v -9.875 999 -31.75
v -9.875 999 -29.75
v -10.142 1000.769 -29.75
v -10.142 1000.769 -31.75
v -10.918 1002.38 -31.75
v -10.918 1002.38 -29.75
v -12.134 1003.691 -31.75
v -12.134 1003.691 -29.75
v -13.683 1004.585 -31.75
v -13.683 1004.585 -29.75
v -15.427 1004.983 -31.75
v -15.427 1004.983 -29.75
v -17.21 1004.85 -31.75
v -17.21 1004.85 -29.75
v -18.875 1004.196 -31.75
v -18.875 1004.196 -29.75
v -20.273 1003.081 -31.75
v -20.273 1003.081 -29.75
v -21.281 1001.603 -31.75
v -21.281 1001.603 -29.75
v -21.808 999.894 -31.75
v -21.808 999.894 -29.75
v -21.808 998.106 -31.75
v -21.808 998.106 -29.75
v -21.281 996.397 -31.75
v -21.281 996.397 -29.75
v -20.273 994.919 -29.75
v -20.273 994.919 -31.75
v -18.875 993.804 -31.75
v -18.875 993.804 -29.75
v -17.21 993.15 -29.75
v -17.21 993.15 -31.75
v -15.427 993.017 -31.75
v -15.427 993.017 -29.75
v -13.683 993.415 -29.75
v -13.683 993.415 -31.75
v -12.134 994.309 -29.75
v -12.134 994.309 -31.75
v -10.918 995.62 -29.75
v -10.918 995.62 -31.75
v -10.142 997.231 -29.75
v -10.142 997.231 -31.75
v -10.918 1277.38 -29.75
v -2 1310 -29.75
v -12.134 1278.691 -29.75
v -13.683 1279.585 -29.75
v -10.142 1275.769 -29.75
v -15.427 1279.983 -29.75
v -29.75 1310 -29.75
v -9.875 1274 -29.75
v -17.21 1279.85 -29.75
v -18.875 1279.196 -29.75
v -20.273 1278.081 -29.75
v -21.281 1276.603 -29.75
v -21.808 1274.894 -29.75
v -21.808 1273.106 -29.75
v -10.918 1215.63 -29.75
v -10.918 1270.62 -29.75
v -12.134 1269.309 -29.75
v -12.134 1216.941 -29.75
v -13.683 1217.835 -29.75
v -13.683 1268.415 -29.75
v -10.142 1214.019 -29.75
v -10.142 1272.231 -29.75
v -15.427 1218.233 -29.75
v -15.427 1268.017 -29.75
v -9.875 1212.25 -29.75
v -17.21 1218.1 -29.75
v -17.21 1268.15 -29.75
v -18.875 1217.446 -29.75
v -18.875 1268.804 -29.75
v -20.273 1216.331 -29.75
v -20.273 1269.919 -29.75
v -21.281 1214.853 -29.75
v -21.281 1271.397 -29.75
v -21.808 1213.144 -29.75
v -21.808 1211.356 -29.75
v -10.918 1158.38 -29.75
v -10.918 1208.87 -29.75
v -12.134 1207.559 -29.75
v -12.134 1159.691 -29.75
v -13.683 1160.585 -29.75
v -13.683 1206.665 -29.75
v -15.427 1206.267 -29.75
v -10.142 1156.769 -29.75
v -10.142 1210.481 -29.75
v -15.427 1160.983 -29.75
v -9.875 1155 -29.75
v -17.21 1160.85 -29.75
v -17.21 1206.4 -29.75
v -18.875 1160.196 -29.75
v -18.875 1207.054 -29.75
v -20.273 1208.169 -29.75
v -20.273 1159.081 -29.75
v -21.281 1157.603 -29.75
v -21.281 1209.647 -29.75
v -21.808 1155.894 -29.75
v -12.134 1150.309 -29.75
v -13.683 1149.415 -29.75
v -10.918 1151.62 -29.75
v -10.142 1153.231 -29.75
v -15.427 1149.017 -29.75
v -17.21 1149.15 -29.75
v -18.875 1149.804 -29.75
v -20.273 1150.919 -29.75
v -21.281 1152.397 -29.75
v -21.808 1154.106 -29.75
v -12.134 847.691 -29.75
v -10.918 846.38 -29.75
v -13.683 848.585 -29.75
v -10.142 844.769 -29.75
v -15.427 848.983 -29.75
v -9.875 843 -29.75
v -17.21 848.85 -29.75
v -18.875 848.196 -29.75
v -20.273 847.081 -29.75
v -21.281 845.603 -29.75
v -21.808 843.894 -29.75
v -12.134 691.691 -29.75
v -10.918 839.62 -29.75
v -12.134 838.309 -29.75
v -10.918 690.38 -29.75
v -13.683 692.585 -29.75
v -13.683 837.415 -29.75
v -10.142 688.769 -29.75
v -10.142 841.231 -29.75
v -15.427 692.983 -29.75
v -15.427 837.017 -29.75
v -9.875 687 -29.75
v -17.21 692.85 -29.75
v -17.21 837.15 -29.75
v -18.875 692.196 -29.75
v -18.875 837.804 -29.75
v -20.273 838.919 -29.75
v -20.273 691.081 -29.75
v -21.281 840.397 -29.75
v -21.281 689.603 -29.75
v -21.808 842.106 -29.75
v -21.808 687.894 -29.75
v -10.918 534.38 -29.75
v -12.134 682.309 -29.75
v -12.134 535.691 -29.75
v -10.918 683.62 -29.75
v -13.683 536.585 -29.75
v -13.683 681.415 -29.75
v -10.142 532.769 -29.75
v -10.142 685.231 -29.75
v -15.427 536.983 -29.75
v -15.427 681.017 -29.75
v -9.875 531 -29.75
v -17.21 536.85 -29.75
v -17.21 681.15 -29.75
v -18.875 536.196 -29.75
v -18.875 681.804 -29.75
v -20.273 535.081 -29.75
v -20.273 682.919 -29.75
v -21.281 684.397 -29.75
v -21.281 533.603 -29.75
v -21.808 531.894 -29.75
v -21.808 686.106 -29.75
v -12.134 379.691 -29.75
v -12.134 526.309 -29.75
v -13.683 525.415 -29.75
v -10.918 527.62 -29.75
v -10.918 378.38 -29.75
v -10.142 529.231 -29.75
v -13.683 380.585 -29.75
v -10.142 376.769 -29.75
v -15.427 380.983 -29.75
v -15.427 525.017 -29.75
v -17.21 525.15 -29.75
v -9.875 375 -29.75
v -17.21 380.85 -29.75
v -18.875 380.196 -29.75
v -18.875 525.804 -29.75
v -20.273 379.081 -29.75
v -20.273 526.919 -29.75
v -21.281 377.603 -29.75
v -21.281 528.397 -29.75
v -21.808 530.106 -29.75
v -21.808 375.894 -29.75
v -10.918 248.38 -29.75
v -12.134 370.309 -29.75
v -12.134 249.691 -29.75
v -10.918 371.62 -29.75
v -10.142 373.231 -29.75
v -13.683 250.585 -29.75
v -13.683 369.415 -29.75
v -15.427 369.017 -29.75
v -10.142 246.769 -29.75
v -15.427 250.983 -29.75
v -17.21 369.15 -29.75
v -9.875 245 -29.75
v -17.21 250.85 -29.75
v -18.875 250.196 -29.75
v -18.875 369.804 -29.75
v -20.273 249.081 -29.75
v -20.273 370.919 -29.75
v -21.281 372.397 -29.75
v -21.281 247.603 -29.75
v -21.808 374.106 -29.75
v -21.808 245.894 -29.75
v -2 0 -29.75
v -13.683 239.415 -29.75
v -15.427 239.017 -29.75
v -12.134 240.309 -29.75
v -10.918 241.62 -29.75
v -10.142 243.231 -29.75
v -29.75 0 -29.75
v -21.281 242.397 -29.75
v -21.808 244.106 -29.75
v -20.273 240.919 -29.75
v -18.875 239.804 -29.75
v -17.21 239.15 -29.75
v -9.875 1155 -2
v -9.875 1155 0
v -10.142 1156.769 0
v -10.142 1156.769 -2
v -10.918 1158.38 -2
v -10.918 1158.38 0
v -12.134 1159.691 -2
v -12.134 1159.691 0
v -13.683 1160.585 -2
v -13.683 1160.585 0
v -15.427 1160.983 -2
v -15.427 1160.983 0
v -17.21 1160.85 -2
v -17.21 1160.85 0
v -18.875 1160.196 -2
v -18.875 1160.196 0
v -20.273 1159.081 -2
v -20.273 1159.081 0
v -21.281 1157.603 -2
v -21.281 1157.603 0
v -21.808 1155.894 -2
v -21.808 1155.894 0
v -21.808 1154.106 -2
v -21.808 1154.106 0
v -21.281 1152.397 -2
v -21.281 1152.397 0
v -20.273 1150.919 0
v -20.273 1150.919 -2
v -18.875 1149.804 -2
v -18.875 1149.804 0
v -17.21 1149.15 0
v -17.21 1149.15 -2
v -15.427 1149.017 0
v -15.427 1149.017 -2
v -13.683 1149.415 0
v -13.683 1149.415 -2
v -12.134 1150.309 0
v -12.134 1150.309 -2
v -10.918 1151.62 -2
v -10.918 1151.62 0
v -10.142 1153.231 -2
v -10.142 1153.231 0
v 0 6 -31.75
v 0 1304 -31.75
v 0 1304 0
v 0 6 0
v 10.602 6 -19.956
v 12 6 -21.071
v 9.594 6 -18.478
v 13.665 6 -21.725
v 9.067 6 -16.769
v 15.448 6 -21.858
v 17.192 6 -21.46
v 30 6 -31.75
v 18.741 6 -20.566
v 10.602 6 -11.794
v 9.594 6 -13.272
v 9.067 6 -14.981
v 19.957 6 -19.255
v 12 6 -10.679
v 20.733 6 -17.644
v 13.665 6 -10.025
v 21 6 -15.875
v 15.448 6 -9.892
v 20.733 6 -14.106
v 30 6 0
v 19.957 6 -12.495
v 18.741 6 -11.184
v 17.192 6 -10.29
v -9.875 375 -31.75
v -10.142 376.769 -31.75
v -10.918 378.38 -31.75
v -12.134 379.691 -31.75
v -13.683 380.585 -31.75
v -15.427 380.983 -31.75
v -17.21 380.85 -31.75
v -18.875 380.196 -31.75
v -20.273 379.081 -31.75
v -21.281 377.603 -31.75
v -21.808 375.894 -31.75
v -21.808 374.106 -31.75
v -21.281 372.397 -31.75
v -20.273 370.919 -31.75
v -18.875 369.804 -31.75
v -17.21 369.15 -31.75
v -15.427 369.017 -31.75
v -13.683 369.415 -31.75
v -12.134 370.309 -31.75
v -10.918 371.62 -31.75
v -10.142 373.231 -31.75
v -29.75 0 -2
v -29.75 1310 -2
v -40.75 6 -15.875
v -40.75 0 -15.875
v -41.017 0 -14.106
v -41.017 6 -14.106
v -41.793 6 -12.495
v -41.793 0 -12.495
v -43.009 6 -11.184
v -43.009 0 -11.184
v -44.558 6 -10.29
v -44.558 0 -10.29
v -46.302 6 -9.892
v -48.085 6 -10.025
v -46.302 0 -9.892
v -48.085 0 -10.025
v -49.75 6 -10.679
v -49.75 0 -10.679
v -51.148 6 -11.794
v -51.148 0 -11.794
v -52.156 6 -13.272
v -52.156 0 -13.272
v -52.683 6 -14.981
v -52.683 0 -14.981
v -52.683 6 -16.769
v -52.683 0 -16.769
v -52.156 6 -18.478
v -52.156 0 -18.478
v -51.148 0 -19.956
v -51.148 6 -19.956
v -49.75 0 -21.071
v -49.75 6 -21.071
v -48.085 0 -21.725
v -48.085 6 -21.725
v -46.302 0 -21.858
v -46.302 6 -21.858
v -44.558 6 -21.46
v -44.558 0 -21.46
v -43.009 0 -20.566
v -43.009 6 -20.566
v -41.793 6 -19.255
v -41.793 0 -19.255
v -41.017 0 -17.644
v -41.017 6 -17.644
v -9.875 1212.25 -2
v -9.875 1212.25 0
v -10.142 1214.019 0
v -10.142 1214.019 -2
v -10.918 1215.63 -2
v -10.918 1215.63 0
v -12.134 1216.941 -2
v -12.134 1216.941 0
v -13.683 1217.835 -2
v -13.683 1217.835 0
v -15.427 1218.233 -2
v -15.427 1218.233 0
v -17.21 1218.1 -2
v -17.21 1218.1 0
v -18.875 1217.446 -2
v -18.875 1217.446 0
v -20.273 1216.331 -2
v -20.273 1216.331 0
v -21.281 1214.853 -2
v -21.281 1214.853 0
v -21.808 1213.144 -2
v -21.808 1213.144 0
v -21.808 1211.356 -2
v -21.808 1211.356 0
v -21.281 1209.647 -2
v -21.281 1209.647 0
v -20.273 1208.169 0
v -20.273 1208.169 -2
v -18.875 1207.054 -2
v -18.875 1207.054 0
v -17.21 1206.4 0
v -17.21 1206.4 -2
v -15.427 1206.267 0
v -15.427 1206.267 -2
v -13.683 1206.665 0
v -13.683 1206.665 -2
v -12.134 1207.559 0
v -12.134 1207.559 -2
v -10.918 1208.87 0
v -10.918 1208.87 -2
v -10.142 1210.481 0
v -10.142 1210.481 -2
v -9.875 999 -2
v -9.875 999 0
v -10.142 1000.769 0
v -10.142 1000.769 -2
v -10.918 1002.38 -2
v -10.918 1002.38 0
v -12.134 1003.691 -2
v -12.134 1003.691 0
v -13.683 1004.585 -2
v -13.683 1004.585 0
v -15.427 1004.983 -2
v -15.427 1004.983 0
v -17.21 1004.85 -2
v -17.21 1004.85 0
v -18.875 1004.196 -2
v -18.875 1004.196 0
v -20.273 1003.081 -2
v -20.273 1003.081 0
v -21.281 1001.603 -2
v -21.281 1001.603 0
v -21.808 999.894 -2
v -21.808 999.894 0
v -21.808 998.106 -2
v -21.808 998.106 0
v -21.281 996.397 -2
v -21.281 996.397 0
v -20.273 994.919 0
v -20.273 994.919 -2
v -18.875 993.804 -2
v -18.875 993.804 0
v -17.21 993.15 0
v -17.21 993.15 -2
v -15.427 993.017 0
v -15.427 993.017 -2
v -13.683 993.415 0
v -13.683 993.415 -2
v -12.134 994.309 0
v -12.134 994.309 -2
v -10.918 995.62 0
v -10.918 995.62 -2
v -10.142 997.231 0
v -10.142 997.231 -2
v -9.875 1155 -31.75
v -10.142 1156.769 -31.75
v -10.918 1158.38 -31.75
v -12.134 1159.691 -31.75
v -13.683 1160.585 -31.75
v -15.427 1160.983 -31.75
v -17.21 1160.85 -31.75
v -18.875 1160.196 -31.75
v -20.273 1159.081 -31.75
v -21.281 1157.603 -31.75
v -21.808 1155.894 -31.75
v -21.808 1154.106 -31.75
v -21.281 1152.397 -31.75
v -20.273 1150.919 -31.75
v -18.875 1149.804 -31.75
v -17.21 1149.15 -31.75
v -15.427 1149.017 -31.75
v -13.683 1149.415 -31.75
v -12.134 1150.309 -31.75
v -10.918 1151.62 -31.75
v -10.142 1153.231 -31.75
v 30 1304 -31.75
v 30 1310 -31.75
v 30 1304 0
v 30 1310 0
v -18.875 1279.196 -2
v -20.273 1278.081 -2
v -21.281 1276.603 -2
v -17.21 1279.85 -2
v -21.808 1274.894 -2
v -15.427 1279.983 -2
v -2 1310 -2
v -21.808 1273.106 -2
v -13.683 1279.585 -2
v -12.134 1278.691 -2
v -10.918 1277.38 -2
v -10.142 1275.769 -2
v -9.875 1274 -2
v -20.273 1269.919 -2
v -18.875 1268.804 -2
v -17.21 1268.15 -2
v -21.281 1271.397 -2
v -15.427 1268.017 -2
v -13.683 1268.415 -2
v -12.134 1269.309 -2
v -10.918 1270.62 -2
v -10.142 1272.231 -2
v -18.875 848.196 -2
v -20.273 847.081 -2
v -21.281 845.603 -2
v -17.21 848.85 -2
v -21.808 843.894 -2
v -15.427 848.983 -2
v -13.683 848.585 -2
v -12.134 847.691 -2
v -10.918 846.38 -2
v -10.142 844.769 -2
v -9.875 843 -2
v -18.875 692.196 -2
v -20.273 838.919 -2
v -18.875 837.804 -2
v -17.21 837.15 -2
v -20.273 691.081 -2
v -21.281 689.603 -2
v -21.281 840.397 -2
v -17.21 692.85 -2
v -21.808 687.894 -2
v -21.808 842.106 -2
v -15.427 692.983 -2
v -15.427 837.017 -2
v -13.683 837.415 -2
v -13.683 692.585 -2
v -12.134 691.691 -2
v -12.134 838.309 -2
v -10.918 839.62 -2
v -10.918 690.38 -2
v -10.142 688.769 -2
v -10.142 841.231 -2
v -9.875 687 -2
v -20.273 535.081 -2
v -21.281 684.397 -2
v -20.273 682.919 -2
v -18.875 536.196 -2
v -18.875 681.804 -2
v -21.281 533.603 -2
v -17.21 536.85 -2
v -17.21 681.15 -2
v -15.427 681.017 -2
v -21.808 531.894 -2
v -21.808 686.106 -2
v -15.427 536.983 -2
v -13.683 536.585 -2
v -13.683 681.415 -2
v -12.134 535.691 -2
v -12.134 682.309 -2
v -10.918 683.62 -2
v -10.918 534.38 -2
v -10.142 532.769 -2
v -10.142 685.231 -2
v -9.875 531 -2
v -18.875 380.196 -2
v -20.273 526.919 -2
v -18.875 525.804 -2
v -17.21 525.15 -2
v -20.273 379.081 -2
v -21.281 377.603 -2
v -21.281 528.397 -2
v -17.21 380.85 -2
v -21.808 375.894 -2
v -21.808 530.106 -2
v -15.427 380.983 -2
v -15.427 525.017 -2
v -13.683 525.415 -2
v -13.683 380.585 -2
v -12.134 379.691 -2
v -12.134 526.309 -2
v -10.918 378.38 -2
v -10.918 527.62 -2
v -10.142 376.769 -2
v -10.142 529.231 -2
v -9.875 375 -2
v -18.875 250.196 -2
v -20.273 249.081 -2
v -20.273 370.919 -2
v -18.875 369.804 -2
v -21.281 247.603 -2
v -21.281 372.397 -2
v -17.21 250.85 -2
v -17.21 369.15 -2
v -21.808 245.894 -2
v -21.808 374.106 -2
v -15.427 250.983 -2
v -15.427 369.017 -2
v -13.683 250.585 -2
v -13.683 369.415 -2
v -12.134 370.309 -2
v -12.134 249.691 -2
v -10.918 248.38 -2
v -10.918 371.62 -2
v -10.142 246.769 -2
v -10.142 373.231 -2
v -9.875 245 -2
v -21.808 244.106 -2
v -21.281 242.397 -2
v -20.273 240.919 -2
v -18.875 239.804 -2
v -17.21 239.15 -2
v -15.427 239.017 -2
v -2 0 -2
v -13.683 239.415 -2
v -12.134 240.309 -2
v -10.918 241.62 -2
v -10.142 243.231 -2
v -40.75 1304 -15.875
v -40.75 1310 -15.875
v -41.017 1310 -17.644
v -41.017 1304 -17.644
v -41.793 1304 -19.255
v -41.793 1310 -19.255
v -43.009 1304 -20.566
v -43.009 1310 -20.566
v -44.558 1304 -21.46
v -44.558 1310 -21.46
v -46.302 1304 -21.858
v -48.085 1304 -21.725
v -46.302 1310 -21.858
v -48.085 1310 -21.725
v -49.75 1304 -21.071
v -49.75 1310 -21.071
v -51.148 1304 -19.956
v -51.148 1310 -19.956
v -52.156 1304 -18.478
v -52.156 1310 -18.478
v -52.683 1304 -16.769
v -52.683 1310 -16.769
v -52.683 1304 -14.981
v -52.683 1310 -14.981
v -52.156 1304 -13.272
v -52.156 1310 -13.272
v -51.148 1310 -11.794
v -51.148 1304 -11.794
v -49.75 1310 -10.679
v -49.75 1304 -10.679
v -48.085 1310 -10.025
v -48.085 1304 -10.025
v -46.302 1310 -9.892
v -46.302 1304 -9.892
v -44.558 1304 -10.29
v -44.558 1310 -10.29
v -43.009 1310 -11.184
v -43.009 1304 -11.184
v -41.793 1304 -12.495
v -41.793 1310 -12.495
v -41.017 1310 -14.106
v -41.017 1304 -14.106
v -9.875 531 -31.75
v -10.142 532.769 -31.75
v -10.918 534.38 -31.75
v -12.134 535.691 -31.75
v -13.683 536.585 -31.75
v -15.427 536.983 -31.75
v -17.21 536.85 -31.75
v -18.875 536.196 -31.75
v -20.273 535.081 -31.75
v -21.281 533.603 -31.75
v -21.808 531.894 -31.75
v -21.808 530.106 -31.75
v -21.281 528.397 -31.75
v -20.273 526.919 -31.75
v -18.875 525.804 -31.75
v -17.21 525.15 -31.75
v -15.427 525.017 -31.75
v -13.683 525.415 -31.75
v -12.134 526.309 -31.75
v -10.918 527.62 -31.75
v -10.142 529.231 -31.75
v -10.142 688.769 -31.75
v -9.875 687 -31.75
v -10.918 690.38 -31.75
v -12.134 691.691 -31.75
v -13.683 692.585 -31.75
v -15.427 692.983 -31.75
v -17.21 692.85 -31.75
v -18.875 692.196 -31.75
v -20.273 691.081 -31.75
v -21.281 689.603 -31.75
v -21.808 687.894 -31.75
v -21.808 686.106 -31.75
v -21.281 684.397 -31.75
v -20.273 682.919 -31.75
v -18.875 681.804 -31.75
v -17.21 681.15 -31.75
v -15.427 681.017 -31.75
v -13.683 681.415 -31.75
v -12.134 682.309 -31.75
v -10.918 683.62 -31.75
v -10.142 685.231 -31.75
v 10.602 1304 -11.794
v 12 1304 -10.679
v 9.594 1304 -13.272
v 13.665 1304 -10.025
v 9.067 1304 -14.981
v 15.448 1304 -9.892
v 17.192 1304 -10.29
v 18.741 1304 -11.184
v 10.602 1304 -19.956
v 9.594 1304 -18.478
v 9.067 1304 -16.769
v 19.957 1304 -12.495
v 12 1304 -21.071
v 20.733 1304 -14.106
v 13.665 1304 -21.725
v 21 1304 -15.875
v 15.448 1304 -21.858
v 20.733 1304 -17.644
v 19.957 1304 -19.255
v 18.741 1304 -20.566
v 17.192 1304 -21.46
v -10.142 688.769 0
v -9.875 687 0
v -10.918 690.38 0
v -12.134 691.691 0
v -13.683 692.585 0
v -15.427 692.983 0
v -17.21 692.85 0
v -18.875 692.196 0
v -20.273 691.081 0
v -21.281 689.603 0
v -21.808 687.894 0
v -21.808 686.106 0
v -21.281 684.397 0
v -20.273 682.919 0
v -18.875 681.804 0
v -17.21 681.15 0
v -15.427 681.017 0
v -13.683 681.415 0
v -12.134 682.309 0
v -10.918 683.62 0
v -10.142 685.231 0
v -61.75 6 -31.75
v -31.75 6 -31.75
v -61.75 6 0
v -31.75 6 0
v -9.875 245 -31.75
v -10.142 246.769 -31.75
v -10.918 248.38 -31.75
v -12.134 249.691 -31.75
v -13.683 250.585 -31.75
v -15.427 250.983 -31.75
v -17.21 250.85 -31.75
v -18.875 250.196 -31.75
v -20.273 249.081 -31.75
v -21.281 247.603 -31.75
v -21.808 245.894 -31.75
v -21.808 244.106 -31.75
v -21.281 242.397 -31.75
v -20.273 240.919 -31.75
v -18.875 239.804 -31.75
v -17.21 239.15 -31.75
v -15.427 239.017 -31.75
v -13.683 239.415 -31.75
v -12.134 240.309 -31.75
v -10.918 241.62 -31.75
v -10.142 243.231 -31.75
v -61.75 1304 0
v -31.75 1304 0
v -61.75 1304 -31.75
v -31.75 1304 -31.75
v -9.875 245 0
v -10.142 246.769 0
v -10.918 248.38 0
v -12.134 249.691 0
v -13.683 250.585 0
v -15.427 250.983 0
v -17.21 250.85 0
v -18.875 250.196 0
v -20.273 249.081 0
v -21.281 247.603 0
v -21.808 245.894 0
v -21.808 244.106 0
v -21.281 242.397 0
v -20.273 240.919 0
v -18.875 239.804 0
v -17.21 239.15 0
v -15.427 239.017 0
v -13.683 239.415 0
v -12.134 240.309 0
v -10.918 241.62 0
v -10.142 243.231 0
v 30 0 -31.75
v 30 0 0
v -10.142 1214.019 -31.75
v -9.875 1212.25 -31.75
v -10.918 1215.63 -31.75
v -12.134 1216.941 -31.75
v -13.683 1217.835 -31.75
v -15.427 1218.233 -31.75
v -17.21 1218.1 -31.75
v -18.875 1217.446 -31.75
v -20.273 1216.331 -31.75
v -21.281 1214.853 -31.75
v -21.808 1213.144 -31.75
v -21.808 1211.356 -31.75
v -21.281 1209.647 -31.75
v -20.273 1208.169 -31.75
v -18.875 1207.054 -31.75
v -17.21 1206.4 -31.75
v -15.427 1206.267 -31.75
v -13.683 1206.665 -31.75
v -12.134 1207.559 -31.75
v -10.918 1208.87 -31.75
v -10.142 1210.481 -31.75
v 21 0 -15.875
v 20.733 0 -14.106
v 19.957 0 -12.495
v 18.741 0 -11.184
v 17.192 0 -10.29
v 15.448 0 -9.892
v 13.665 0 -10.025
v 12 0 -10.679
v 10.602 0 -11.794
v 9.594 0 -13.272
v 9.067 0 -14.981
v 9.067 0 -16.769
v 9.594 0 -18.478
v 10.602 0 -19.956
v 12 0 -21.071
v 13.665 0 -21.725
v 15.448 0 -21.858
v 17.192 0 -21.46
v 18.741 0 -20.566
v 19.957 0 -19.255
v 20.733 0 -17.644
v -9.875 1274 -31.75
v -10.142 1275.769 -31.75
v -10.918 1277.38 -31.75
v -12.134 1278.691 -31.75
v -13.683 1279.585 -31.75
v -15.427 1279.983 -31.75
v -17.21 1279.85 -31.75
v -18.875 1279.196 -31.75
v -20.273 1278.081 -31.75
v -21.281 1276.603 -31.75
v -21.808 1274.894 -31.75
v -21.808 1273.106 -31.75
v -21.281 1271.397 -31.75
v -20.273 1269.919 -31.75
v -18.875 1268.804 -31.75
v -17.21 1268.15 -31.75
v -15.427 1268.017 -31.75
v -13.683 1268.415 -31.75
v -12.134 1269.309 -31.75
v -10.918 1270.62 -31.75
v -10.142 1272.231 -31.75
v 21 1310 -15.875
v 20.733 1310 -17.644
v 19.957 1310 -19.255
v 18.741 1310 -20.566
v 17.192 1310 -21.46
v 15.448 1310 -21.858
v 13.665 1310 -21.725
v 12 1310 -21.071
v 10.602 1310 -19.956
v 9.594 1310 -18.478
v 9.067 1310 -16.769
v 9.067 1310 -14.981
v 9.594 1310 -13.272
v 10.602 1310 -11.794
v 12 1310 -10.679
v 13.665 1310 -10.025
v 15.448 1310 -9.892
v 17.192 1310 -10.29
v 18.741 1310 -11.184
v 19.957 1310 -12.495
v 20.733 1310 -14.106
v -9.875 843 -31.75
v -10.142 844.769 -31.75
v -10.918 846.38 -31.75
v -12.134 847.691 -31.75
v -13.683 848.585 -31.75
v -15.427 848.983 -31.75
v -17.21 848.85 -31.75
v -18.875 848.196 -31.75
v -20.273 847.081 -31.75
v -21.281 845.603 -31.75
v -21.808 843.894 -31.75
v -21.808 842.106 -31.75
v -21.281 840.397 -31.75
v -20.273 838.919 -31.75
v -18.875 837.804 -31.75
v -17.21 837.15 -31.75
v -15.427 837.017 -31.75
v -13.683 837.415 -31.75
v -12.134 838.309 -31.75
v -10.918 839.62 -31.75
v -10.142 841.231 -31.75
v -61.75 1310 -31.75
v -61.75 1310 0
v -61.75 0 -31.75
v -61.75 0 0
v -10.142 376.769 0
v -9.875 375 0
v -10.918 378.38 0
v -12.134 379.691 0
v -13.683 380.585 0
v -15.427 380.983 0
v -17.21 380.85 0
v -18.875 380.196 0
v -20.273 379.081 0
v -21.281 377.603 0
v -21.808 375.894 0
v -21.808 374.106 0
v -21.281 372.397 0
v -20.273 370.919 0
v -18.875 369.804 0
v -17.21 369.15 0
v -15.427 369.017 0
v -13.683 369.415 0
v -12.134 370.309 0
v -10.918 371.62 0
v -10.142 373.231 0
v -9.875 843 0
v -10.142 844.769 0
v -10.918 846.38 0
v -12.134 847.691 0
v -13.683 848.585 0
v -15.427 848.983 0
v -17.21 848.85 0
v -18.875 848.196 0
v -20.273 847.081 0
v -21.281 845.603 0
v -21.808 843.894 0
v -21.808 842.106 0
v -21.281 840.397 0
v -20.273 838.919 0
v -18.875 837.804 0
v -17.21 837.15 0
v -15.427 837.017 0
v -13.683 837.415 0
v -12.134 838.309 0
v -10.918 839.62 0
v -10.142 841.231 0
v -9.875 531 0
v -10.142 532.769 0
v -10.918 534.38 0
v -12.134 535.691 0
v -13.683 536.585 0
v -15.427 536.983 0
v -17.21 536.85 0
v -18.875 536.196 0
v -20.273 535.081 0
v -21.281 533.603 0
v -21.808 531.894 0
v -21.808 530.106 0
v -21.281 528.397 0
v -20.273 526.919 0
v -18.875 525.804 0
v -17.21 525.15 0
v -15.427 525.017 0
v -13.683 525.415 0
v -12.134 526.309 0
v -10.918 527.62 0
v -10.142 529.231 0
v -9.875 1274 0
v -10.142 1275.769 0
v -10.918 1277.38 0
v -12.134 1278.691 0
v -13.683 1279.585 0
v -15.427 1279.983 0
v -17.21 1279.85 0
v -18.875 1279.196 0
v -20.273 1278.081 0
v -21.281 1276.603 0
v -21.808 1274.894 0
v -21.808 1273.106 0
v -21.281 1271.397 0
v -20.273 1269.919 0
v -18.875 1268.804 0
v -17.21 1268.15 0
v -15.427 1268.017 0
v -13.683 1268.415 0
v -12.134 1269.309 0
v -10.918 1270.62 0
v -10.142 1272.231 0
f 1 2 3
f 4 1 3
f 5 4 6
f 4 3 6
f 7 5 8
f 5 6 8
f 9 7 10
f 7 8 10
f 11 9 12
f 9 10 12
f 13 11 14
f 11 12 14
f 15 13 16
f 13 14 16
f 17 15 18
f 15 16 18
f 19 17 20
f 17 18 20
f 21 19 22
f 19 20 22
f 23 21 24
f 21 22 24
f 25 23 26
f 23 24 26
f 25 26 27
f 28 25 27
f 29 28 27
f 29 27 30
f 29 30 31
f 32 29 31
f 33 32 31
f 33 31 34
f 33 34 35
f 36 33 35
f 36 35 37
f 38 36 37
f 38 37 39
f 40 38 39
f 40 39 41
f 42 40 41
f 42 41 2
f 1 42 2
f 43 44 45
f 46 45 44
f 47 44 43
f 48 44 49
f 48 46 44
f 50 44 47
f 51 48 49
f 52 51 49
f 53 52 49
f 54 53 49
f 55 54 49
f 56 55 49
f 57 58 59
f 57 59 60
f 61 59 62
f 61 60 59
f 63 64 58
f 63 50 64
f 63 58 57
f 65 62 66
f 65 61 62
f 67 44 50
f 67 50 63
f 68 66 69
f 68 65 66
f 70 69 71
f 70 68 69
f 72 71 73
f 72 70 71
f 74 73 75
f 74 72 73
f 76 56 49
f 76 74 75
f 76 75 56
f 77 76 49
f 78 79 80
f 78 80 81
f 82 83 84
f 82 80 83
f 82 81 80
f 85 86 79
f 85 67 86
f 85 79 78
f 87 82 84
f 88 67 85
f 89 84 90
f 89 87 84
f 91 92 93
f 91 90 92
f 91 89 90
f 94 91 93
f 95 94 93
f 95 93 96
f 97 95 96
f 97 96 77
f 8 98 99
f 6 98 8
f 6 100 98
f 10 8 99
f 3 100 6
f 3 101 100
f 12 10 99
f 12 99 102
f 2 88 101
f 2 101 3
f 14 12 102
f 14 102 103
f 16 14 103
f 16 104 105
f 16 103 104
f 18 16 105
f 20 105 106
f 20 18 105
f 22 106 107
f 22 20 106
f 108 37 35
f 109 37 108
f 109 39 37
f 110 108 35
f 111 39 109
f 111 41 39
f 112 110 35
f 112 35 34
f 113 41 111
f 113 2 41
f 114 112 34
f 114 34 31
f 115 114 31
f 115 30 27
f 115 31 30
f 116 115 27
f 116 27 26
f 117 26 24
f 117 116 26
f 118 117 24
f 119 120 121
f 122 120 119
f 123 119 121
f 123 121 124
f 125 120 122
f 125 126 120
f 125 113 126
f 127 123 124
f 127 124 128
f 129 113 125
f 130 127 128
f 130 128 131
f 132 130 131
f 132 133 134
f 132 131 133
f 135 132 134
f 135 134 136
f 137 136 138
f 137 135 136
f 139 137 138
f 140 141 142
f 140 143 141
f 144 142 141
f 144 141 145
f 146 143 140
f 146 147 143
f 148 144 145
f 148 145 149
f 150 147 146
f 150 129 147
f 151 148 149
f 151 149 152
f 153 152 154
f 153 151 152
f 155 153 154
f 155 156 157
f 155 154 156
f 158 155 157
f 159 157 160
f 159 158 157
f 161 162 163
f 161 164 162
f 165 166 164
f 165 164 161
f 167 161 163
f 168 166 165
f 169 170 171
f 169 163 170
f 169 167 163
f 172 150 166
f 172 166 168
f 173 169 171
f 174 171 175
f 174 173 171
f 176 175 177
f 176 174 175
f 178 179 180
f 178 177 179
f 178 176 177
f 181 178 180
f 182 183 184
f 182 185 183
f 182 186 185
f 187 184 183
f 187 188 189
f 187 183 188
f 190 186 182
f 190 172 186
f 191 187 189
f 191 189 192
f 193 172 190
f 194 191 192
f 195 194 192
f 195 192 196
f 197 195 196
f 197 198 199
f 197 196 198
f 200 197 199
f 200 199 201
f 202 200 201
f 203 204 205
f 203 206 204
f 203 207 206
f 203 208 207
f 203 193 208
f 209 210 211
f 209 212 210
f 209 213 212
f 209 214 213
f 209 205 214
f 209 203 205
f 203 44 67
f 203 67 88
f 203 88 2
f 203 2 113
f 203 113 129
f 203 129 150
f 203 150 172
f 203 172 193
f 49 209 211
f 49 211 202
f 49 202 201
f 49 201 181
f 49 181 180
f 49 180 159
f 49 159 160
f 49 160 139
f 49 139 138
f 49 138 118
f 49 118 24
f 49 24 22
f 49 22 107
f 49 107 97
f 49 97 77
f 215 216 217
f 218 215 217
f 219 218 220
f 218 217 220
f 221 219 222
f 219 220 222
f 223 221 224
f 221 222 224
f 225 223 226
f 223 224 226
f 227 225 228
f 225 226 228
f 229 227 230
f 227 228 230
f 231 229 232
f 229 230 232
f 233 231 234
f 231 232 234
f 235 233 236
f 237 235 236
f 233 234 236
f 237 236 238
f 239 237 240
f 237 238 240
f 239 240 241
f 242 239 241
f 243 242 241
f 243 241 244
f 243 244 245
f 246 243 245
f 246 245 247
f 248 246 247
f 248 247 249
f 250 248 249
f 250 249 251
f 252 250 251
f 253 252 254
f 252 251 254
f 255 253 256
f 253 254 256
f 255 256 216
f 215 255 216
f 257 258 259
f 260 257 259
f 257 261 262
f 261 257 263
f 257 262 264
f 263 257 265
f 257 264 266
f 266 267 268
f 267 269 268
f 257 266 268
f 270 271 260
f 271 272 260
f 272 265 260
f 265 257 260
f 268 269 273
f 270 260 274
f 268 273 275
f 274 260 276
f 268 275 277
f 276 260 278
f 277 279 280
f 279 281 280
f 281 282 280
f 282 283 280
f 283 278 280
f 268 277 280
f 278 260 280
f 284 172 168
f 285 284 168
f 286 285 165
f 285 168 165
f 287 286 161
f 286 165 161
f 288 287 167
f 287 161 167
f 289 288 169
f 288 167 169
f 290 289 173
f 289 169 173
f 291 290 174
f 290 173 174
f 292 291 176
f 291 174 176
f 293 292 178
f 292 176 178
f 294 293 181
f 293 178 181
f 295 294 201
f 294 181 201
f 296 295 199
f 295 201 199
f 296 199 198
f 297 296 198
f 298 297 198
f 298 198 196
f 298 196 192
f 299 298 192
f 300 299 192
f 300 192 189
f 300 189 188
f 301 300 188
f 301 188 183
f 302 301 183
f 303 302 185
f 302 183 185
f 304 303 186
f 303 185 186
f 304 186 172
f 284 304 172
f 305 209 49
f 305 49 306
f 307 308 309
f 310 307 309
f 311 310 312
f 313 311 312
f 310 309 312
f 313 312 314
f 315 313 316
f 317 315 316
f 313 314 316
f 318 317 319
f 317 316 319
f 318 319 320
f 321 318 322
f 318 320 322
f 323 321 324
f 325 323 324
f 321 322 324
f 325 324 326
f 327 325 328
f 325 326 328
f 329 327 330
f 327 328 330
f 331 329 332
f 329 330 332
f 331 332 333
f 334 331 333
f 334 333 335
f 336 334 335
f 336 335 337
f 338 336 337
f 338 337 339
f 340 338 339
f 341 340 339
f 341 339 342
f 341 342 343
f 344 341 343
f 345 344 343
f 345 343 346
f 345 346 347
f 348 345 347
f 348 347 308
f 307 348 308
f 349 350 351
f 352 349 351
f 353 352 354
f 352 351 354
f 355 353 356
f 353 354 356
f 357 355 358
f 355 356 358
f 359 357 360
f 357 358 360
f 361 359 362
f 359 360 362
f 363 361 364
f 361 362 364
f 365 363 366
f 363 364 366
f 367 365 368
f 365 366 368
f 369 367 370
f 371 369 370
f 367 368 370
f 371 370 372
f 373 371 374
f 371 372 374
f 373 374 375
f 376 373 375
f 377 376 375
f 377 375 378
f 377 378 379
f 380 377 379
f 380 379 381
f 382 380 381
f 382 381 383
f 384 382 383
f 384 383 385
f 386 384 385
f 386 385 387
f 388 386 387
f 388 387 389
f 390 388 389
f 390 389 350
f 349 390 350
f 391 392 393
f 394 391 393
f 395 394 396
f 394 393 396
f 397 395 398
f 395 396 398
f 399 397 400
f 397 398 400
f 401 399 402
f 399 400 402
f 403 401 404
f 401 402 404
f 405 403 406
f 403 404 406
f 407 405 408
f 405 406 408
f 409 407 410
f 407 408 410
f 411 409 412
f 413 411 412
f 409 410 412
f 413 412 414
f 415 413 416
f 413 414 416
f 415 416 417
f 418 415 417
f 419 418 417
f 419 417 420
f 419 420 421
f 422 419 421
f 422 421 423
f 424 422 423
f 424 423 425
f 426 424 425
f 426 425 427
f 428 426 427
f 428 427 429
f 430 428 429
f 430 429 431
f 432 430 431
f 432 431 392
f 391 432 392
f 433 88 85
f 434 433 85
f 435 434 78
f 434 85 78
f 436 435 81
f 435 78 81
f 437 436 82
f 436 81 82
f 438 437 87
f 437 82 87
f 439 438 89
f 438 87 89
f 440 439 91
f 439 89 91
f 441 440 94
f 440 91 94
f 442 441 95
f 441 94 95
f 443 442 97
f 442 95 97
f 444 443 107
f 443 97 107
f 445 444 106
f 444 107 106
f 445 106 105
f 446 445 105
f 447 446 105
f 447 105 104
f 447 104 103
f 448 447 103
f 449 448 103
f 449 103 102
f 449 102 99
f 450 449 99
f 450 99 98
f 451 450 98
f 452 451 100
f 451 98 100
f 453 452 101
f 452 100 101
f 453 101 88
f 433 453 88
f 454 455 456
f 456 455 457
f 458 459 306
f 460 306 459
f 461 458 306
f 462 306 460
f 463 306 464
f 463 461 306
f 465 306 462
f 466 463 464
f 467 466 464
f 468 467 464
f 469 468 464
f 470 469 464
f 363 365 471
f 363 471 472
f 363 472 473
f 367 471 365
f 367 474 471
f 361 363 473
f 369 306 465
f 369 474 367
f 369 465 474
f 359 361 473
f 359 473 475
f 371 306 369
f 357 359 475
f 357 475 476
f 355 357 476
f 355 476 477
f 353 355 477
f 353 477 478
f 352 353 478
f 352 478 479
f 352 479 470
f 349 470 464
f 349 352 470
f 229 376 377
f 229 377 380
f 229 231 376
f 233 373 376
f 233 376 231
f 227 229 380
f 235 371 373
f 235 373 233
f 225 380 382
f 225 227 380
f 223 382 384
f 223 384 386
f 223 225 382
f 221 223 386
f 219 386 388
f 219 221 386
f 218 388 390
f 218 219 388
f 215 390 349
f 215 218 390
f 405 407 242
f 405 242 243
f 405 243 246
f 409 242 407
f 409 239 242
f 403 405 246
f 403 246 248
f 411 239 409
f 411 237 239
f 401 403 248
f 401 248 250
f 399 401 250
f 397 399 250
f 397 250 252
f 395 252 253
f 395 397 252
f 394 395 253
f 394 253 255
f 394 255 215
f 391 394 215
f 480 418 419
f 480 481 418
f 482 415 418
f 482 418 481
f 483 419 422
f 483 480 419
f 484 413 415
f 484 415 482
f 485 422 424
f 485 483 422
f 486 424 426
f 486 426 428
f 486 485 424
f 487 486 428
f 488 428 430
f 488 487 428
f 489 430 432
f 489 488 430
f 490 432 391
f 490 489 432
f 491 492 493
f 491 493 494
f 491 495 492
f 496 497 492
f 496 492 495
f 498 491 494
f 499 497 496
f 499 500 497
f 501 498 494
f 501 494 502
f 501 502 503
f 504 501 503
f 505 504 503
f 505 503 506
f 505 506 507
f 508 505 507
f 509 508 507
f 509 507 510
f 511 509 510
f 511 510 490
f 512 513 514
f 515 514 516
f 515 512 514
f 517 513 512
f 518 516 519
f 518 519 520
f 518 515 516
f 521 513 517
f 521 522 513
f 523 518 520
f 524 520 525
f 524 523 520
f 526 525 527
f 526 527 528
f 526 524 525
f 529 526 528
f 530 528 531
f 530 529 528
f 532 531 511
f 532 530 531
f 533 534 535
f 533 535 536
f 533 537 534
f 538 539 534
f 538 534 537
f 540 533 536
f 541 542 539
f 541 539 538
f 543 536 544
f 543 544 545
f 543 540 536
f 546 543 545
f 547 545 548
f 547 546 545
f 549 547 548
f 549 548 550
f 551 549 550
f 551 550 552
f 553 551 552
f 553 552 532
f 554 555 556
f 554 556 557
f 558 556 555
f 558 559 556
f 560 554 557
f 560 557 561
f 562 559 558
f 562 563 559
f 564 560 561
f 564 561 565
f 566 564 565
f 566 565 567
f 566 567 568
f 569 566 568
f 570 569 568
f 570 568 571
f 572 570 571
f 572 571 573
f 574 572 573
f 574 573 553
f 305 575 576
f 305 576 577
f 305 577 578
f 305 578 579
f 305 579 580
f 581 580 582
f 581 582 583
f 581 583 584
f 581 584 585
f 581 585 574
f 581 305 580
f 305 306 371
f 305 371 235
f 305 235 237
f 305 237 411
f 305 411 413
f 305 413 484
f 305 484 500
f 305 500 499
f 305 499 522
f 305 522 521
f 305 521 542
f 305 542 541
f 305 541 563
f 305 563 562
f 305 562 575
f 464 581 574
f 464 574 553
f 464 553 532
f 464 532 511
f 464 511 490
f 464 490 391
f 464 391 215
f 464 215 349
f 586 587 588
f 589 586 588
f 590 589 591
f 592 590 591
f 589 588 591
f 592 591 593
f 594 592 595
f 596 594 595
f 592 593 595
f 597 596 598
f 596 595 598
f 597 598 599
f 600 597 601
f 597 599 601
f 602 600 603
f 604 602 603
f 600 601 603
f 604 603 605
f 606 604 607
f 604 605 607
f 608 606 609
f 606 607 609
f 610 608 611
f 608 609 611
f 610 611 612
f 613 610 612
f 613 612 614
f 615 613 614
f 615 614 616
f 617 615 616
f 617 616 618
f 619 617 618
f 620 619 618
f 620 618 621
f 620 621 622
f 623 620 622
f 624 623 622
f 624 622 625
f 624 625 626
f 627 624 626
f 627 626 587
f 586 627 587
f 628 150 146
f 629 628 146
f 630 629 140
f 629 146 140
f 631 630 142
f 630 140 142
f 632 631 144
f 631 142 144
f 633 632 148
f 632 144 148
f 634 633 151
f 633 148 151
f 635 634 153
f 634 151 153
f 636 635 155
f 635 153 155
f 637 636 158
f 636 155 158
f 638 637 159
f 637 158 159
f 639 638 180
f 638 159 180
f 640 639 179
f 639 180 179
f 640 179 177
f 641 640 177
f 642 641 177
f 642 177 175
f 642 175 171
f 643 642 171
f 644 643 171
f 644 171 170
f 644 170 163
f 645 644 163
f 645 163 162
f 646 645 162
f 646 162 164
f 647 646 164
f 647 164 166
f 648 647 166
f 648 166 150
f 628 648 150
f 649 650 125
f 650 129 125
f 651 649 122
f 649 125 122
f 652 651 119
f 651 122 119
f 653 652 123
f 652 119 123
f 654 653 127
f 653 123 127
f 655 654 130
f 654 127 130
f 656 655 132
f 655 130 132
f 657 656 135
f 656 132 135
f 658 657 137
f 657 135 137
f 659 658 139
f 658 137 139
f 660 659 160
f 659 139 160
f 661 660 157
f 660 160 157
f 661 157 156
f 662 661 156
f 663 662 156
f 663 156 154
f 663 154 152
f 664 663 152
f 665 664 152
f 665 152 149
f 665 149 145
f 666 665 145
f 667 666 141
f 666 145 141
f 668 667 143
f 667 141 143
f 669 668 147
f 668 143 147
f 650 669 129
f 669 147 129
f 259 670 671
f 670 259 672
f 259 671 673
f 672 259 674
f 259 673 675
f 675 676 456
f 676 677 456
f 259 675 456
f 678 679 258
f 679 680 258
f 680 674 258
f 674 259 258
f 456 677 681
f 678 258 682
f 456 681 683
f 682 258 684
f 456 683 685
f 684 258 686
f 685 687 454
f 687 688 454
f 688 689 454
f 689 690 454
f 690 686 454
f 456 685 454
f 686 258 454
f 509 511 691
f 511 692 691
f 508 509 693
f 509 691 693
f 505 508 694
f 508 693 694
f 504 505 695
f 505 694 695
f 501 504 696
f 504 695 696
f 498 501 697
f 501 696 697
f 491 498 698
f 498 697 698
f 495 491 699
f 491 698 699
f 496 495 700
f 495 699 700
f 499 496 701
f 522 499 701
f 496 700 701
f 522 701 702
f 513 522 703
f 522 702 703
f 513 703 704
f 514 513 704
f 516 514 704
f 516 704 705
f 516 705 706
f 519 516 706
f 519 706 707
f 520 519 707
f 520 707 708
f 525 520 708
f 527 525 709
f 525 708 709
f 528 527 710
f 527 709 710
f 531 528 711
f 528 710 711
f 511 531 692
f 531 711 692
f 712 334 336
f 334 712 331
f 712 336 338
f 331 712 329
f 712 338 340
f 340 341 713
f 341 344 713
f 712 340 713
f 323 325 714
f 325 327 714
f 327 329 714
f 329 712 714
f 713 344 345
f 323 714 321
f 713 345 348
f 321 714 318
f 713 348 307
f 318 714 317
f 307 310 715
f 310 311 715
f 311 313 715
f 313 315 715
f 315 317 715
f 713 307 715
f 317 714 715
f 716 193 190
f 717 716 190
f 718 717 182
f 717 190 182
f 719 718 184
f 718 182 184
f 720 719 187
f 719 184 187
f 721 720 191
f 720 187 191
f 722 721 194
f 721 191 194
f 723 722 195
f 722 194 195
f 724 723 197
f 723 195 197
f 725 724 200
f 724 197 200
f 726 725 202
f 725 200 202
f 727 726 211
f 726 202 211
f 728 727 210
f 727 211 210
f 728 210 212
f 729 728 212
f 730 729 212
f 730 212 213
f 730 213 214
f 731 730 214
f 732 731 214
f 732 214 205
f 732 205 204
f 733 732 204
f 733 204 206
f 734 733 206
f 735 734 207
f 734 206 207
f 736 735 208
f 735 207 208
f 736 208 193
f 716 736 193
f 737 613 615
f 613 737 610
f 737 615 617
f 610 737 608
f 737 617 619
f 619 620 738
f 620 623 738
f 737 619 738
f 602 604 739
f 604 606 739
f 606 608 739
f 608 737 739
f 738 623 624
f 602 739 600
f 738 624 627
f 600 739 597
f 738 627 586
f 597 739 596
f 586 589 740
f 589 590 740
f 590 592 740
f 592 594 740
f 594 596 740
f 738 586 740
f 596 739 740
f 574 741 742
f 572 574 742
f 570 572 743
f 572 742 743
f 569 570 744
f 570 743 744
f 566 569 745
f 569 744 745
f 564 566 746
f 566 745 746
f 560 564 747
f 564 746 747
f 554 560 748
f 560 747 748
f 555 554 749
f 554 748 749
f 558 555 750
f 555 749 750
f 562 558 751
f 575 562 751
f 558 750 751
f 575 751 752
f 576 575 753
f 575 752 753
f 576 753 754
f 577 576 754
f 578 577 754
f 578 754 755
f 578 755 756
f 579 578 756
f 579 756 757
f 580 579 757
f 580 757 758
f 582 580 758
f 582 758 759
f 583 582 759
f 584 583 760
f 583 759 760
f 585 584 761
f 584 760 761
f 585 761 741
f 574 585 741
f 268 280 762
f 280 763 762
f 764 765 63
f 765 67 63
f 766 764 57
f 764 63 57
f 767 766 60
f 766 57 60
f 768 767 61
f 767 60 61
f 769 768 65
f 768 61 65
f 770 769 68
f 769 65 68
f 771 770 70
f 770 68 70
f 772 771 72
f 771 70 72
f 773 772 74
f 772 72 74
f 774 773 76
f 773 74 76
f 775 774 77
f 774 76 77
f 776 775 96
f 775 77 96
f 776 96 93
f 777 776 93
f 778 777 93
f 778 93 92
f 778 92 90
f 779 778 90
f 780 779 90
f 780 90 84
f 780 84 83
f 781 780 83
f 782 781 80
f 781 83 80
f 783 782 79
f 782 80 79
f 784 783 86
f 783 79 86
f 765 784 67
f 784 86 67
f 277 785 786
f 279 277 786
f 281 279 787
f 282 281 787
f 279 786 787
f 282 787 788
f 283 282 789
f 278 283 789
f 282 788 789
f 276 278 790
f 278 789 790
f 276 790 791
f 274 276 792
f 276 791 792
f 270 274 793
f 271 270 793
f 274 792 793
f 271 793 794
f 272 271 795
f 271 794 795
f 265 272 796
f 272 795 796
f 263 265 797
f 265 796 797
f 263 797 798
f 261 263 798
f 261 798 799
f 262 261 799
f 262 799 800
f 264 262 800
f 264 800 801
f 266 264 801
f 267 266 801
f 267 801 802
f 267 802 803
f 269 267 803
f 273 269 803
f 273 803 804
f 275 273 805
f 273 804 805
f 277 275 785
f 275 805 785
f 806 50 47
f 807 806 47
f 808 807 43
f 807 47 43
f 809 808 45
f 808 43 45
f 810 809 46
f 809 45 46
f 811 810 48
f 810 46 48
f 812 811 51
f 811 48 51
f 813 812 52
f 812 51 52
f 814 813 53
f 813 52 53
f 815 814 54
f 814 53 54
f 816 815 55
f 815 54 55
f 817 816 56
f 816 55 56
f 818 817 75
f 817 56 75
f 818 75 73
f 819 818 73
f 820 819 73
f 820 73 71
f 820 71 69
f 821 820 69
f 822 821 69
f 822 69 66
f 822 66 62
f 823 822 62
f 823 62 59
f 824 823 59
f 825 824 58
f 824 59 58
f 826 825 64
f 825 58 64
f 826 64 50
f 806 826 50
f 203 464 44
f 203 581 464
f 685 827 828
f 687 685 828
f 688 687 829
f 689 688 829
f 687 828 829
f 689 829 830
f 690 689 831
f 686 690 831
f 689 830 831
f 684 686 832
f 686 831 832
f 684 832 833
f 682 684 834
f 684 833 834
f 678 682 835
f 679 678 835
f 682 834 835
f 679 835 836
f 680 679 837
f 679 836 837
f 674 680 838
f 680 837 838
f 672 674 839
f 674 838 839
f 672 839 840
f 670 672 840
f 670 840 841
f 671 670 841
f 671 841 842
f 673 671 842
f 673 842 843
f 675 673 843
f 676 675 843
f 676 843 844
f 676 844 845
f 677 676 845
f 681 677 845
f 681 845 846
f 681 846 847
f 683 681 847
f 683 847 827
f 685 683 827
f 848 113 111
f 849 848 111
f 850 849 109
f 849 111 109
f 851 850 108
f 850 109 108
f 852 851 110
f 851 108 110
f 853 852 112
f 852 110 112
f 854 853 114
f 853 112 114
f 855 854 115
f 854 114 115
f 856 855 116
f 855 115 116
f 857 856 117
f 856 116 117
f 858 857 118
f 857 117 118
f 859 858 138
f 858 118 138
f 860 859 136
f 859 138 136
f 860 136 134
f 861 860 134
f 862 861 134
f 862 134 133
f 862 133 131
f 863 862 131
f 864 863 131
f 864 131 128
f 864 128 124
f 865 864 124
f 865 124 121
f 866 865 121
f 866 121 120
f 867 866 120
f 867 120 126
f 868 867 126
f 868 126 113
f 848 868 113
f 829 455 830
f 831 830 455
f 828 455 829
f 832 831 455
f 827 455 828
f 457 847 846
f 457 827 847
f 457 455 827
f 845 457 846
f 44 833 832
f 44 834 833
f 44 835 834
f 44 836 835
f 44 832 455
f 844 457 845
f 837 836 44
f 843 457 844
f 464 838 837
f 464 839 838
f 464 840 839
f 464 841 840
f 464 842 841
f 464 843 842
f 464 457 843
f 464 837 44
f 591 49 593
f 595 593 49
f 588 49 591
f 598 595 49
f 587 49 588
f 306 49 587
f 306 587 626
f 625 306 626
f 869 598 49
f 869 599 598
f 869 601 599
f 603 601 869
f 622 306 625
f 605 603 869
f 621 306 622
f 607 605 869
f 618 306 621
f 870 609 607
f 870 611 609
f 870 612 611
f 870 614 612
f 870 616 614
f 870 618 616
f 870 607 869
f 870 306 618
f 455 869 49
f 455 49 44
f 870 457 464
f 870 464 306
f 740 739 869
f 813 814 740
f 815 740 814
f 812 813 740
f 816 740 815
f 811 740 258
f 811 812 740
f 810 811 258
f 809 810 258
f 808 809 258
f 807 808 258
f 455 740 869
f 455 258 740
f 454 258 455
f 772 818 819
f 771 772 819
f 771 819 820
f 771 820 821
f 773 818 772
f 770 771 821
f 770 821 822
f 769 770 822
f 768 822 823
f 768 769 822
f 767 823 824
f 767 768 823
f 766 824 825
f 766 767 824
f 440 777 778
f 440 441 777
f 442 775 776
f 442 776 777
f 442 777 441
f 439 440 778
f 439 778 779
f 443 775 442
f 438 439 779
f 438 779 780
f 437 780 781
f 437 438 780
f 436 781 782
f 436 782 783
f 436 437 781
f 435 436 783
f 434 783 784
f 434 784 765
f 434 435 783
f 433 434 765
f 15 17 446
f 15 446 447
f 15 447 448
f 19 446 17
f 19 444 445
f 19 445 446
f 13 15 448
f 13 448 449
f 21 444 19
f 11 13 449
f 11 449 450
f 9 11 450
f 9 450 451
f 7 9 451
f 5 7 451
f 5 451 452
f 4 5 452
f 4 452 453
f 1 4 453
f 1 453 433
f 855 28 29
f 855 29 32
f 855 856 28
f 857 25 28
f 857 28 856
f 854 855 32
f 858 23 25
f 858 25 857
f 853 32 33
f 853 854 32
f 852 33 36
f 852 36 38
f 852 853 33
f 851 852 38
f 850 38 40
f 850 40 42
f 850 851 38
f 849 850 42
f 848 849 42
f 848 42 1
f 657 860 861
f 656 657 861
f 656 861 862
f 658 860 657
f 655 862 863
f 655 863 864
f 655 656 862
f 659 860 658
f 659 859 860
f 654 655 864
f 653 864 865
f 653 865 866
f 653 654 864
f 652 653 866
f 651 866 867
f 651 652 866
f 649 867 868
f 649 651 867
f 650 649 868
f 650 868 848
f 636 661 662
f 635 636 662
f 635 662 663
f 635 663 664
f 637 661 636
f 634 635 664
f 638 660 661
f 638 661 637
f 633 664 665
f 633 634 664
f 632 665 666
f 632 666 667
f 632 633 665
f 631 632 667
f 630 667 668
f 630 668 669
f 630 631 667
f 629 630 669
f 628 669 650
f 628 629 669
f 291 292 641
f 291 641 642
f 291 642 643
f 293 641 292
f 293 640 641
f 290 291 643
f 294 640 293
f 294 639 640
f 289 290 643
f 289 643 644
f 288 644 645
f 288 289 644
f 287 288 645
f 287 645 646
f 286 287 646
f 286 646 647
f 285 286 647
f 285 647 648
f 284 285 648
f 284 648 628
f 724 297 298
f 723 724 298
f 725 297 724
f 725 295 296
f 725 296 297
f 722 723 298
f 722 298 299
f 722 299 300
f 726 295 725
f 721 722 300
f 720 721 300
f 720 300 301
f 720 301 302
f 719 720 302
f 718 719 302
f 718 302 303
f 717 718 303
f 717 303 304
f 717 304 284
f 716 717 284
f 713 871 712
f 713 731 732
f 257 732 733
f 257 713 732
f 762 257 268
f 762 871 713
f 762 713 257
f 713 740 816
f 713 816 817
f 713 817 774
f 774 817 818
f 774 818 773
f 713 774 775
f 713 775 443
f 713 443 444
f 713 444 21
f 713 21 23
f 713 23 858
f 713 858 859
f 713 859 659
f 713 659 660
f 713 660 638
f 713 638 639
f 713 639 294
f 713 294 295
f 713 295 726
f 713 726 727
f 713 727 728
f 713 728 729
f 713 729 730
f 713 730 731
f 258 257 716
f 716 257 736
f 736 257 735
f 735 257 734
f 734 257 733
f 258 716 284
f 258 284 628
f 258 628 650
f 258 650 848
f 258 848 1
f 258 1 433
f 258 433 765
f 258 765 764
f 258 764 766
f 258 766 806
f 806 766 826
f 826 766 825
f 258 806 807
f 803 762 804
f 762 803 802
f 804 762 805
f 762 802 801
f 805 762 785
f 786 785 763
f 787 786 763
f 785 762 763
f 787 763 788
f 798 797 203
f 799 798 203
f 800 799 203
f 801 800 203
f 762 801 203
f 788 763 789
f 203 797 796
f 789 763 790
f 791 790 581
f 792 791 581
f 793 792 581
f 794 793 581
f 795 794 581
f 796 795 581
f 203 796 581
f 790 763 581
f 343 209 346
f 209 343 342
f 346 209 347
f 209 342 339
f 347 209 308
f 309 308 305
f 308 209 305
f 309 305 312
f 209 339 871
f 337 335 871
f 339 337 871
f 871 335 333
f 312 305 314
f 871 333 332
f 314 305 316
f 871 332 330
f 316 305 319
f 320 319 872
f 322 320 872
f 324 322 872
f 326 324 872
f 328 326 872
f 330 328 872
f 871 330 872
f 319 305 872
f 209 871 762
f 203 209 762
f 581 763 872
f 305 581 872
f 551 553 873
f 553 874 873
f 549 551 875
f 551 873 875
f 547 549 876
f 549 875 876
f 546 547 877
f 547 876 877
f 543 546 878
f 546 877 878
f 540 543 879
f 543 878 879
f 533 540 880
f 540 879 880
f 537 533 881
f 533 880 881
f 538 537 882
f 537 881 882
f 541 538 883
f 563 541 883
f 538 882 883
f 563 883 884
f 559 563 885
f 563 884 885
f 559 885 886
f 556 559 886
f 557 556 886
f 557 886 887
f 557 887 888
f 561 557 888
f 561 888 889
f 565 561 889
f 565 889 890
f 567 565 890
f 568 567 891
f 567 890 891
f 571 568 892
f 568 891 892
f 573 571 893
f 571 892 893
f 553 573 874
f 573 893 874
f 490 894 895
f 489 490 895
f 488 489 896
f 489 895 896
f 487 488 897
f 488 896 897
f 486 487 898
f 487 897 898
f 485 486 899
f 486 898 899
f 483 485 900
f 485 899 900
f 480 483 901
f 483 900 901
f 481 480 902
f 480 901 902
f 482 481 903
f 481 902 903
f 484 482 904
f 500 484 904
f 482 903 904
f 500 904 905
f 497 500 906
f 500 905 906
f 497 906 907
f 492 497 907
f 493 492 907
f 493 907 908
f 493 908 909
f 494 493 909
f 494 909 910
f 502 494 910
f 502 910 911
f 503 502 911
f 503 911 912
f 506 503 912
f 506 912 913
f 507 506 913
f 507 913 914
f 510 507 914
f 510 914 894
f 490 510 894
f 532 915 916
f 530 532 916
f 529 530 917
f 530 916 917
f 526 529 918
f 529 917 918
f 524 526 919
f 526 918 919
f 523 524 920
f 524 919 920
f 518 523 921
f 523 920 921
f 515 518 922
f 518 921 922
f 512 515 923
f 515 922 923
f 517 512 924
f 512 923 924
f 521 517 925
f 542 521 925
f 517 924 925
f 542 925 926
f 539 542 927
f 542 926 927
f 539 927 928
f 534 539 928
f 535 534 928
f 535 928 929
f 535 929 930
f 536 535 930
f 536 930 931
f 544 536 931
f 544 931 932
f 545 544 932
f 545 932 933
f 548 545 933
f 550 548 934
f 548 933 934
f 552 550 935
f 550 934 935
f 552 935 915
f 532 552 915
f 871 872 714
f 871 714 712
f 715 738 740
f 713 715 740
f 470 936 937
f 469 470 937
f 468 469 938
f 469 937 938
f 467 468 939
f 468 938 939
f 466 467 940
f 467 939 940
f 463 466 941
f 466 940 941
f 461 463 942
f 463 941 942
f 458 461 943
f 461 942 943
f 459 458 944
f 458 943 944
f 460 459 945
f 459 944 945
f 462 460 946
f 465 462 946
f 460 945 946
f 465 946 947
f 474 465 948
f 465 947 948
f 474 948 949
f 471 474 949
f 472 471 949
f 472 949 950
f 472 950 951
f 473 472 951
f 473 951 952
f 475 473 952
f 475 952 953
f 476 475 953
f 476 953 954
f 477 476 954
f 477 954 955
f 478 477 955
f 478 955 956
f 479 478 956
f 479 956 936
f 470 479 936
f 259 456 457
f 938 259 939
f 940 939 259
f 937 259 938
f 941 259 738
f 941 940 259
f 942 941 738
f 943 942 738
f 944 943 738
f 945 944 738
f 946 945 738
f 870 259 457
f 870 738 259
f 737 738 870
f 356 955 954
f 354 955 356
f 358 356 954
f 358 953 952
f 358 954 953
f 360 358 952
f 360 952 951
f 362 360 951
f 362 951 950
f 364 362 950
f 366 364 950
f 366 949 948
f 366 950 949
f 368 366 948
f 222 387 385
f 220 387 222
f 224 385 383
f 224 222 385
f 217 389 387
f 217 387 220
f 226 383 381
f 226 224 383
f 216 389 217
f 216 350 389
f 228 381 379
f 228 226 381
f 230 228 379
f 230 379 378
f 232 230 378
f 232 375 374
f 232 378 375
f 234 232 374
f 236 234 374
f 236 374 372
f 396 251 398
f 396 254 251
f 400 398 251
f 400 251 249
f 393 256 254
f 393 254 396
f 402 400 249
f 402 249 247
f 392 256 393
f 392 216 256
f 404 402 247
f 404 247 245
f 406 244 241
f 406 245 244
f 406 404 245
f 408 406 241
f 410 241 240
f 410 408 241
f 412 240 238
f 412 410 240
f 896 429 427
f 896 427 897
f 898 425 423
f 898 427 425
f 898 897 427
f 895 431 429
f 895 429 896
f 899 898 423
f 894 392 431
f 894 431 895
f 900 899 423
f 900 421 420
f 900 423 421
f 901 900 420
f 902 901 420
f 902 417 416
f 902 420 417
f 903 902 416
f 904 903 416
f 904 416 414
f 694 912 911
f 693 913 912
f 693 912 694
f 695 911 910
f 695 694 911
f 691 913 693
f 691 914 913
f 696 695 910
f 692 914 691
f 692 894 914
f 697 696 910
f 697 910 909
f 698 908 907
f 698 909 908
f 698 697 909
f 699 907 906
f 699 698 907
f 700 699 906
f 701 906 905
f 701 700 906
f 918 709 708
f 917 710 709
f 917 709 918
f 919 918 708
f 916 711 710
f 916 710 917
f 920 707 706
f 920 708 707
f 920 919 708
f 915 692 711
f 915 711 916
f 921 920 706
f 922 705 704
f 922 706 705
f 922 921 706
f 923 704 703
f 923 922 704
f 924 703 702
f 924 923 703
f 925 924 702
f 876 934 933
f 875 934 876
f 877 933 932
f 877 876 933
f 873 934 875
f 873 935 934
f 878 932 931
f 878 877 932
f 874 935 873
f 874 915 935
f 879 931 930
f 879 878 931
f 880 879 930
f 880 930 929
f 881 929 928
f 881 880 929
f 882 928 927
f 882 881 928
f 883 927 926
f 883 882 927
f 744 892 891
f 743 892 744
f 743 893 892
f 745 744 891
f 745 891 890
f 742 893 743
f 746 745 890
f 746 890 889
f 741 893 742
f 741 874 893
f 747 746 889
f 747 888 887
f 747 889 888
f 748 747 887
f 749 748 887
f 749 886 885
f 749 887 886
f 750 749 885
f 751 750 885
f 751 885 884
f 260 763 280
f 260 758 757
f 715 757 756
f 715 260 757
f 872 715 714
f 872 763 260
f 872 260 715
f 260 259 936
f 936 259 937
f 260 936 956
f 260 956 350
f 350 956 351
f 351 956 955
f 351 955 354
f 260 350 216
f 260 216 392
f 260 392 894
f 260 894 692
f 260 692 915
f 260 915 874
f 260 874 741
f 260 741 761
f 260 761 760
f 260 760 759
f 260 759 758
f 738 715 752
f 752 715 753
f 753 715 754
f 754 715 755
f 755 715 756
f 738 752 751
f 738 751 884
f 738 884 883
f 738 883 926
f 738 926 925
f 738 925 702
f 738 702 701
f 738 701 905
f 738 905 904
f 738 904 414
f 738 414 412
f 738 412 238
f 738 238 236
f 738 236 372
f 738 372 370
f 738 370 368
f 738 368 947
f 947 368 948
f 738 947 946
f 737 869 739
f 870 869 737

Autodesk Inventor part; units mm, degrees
ref_plane "YZ Plane" through (0, 0, 0) normal (1, 0, 0) x (0, 1, 0)
ref_plane "XZ Plane" through (0, 0, 0) normal (0, 1, 0) x (-1, 0, 0)
ref_plane "XY Plane" through (0, 0, 0) normal (0, 0, 1) x (1, 0, 0)
sketch "Sketch1" plane through (0, 0, 0) normal (0, 1, 0) x (-1, 0, 0)
  line L0 (0, 0) -> (31.75, 0)
  line L1 (31.75, 0) -> (31.75, -31.75)
  line L2 (31.75, -31.75) -> (0, -31.75)
  line L3 (0, -31.75) -> (0, 0)
  line L4 (29.75, -29.75) -> (29.75, -2)
  line L5 (29.75, -2) -> (2, -2)
  line L6 (2, -2) -> (2, -29.75)
  line L7 (2, -29.75) -> (29.75, -29.75)
  dimension "d8" = 31.75
  dimension "d9" = 31.75
  dimension "d10" = 2
extrude "Extrusion1" add sketch "Sketch1" along normal blind 1310
sketch "Sketch3" plane through (-31.75, 0, 0) normal (0, 0, 1) x (1, 0, 0)
  line L0 (31.75, 0) -> (31.75, 368)
  line L1 (31.75, 0) -> (31.75, 1310) projected
  line L2 (0, 0) -> (31.75, 0) projected
  line L3 (31.75, 0) -> (31.75, 1310) projected
  line L4 (0, 1310) -> (31.75, 1310) projected
  line L5 (0, 0) -> (0, 1310) projected
  circle A0 centre (15.875, 375) radius 6
  circle A1 centre (15.875, 531) radius 6
  circle A2 centre (15.875, 687) radius 6
  circle A3 centre (15.875, 843) radius 6
  circle A4 centre (15.875, 999) radius 6
  circle A5 centre (15.875, 1155) radius 6
  dimension "d11" = 368
  dimension "d12" = 12
  dimension "d15" = 12
  dimension "d16" = 156
  dimension "d17" = 12
  dimension "d18" = 156
  dimension "d19" = 12
  dimension "d20" = 156
  dimension "d21" = 12
  dimension "d22" = 156
  dimension "d23" = 12
  dimension "d24" = 156
extrude "Extrusion2" cut sketch "Sketch3" against normal through all contours A0 | A1 | A2 | A3 | A4 | A5
sketch "Sketch4" plane through (0, 0, 0) normal (0, -1, 0) x (1, 0, 0)
  line L0 (0, -31.75) -> (-31.75, -31.75) projected
  line L1 (0, 0) -> (0, -31.75) projected
  line L2 (-31.75, 0) -> (0, 0) projected
  line L3 (-31.75, -31.75) -> (-31.75, 0) projected
  line L4 (-29.75, -29.75) -> (-2, -29.75) projected
  line L5 (-29.75, -2) -> (-29.75, -29.75) projected
  line L6 (-2, -2) -> (-29.75, -2) projected
  line L7 (-2, -29.75) -> (-2, -2) projected
  line L8 (0, 0) -> (30, 0)
  line L9 (30, 0) -> (30, -31.75)
  line L10 (30, -31.75) -> (0, -31.75)
  line L11 (0, -31.75) -> (0, 0)
  line L12 (-31.75, 0) -> (-61.75, 0)
  line L13 (-61.75, 0) -> (-61.75, -31.75)
  line L14 (-61.75, -31.75) -> (-31.75, -31.75)
  line L15 (-31.75, -31.75) -> (-31.75, 0)
  circle A0 centre (-46.75, -15.875) radius 6
  circle A1 centre (15, -15.875) radius 6
  dimension "d25" = 30
  dimension "d26" = 30
  dimension "d29" = 12
  dimension "d30" = 12
extrude "Extrusion3" add sketch "Sketch4" against normal blind 6 contours L1 L8 L9 L10 | L14 L13 L12 L3
sketch "Sketch5" plane through (0, 1310, 0) normal (0, 1, 0) x (1, 0, 0)
  line L0 (0, 31.75) -> (-31.75, 31.75) projected
  line L1 (30, 0) -> (-61.75, 0) projected
  line L2 (0, 31.75) -> (30, 31.75)
  line L3 (30, 31.75) -> (30, 0)
  line L4 (30, 0) -> (0, 0)
  line L5 (0, 0) -> (0, 31.75)
  line L6 (-31.75, 31.75) -> (-31.75, 0) projected
  line L7 (-61.75, 31.75) -> (-61.75, 0) projected
  line L8 (-31.75, 31.75) -> (-61.75, 31.75)
  line L9 (-61.75, 31.75) -> (-61.75, 0)
  line L10 (-61.75, 0) -> (-31.75, 0)
  line L11 (-31.75, 0) -> (-31.75, 31.75)
  circle A0 centre (-46.75, 15.875) radius 6 projected
  circle A1 centre (-46.75, 15.875) radius 6
  circle A2 centre (15, 15.875) radius 6 projected
  circle A3 centre (15, 15.875) radius 6
extrude "Extrusion4" add sketch "Sketch5" against normal blind 6 contours L2 L3 L1 L5 | L6 L1 L7 L8
sketch "Sketch6" plane through (-61.75, 0, 0) normal (0, 0, 1) x (1, 0, 0)
  circle A0 centre (45.875, 1274) radius 6
  line L0 (91.75, 1304) -> (61.75, 1304) projected
  circle A1 centre (45.875, 1212.25) radius 6
  point P0 (61.75, 0)
  dimension "d33" = 12
  dimension "d34" = 30
  dimension "d35" = 12
  dimension "d36" = 61.75
extrude "Extrusion5" cut sketch "Sketch6" against normal through all
sketch "Sketch7" plane through (-61.75, 0, 0) normal (0, 0, 1) x (1, 0, 0)
  circle A0 centre (45.875, 245) radius 6
  circle A1 centre (45.875, 375) radius 6 projected
  point P0 (61.75, 0)
  dimension "d39" = 12
  dimension "d40" = 130
extrude "Extrusion6" cut sketch "Sketch7" against normal through all contours A0
properties part number "Perfil_Vertical_Acero"
